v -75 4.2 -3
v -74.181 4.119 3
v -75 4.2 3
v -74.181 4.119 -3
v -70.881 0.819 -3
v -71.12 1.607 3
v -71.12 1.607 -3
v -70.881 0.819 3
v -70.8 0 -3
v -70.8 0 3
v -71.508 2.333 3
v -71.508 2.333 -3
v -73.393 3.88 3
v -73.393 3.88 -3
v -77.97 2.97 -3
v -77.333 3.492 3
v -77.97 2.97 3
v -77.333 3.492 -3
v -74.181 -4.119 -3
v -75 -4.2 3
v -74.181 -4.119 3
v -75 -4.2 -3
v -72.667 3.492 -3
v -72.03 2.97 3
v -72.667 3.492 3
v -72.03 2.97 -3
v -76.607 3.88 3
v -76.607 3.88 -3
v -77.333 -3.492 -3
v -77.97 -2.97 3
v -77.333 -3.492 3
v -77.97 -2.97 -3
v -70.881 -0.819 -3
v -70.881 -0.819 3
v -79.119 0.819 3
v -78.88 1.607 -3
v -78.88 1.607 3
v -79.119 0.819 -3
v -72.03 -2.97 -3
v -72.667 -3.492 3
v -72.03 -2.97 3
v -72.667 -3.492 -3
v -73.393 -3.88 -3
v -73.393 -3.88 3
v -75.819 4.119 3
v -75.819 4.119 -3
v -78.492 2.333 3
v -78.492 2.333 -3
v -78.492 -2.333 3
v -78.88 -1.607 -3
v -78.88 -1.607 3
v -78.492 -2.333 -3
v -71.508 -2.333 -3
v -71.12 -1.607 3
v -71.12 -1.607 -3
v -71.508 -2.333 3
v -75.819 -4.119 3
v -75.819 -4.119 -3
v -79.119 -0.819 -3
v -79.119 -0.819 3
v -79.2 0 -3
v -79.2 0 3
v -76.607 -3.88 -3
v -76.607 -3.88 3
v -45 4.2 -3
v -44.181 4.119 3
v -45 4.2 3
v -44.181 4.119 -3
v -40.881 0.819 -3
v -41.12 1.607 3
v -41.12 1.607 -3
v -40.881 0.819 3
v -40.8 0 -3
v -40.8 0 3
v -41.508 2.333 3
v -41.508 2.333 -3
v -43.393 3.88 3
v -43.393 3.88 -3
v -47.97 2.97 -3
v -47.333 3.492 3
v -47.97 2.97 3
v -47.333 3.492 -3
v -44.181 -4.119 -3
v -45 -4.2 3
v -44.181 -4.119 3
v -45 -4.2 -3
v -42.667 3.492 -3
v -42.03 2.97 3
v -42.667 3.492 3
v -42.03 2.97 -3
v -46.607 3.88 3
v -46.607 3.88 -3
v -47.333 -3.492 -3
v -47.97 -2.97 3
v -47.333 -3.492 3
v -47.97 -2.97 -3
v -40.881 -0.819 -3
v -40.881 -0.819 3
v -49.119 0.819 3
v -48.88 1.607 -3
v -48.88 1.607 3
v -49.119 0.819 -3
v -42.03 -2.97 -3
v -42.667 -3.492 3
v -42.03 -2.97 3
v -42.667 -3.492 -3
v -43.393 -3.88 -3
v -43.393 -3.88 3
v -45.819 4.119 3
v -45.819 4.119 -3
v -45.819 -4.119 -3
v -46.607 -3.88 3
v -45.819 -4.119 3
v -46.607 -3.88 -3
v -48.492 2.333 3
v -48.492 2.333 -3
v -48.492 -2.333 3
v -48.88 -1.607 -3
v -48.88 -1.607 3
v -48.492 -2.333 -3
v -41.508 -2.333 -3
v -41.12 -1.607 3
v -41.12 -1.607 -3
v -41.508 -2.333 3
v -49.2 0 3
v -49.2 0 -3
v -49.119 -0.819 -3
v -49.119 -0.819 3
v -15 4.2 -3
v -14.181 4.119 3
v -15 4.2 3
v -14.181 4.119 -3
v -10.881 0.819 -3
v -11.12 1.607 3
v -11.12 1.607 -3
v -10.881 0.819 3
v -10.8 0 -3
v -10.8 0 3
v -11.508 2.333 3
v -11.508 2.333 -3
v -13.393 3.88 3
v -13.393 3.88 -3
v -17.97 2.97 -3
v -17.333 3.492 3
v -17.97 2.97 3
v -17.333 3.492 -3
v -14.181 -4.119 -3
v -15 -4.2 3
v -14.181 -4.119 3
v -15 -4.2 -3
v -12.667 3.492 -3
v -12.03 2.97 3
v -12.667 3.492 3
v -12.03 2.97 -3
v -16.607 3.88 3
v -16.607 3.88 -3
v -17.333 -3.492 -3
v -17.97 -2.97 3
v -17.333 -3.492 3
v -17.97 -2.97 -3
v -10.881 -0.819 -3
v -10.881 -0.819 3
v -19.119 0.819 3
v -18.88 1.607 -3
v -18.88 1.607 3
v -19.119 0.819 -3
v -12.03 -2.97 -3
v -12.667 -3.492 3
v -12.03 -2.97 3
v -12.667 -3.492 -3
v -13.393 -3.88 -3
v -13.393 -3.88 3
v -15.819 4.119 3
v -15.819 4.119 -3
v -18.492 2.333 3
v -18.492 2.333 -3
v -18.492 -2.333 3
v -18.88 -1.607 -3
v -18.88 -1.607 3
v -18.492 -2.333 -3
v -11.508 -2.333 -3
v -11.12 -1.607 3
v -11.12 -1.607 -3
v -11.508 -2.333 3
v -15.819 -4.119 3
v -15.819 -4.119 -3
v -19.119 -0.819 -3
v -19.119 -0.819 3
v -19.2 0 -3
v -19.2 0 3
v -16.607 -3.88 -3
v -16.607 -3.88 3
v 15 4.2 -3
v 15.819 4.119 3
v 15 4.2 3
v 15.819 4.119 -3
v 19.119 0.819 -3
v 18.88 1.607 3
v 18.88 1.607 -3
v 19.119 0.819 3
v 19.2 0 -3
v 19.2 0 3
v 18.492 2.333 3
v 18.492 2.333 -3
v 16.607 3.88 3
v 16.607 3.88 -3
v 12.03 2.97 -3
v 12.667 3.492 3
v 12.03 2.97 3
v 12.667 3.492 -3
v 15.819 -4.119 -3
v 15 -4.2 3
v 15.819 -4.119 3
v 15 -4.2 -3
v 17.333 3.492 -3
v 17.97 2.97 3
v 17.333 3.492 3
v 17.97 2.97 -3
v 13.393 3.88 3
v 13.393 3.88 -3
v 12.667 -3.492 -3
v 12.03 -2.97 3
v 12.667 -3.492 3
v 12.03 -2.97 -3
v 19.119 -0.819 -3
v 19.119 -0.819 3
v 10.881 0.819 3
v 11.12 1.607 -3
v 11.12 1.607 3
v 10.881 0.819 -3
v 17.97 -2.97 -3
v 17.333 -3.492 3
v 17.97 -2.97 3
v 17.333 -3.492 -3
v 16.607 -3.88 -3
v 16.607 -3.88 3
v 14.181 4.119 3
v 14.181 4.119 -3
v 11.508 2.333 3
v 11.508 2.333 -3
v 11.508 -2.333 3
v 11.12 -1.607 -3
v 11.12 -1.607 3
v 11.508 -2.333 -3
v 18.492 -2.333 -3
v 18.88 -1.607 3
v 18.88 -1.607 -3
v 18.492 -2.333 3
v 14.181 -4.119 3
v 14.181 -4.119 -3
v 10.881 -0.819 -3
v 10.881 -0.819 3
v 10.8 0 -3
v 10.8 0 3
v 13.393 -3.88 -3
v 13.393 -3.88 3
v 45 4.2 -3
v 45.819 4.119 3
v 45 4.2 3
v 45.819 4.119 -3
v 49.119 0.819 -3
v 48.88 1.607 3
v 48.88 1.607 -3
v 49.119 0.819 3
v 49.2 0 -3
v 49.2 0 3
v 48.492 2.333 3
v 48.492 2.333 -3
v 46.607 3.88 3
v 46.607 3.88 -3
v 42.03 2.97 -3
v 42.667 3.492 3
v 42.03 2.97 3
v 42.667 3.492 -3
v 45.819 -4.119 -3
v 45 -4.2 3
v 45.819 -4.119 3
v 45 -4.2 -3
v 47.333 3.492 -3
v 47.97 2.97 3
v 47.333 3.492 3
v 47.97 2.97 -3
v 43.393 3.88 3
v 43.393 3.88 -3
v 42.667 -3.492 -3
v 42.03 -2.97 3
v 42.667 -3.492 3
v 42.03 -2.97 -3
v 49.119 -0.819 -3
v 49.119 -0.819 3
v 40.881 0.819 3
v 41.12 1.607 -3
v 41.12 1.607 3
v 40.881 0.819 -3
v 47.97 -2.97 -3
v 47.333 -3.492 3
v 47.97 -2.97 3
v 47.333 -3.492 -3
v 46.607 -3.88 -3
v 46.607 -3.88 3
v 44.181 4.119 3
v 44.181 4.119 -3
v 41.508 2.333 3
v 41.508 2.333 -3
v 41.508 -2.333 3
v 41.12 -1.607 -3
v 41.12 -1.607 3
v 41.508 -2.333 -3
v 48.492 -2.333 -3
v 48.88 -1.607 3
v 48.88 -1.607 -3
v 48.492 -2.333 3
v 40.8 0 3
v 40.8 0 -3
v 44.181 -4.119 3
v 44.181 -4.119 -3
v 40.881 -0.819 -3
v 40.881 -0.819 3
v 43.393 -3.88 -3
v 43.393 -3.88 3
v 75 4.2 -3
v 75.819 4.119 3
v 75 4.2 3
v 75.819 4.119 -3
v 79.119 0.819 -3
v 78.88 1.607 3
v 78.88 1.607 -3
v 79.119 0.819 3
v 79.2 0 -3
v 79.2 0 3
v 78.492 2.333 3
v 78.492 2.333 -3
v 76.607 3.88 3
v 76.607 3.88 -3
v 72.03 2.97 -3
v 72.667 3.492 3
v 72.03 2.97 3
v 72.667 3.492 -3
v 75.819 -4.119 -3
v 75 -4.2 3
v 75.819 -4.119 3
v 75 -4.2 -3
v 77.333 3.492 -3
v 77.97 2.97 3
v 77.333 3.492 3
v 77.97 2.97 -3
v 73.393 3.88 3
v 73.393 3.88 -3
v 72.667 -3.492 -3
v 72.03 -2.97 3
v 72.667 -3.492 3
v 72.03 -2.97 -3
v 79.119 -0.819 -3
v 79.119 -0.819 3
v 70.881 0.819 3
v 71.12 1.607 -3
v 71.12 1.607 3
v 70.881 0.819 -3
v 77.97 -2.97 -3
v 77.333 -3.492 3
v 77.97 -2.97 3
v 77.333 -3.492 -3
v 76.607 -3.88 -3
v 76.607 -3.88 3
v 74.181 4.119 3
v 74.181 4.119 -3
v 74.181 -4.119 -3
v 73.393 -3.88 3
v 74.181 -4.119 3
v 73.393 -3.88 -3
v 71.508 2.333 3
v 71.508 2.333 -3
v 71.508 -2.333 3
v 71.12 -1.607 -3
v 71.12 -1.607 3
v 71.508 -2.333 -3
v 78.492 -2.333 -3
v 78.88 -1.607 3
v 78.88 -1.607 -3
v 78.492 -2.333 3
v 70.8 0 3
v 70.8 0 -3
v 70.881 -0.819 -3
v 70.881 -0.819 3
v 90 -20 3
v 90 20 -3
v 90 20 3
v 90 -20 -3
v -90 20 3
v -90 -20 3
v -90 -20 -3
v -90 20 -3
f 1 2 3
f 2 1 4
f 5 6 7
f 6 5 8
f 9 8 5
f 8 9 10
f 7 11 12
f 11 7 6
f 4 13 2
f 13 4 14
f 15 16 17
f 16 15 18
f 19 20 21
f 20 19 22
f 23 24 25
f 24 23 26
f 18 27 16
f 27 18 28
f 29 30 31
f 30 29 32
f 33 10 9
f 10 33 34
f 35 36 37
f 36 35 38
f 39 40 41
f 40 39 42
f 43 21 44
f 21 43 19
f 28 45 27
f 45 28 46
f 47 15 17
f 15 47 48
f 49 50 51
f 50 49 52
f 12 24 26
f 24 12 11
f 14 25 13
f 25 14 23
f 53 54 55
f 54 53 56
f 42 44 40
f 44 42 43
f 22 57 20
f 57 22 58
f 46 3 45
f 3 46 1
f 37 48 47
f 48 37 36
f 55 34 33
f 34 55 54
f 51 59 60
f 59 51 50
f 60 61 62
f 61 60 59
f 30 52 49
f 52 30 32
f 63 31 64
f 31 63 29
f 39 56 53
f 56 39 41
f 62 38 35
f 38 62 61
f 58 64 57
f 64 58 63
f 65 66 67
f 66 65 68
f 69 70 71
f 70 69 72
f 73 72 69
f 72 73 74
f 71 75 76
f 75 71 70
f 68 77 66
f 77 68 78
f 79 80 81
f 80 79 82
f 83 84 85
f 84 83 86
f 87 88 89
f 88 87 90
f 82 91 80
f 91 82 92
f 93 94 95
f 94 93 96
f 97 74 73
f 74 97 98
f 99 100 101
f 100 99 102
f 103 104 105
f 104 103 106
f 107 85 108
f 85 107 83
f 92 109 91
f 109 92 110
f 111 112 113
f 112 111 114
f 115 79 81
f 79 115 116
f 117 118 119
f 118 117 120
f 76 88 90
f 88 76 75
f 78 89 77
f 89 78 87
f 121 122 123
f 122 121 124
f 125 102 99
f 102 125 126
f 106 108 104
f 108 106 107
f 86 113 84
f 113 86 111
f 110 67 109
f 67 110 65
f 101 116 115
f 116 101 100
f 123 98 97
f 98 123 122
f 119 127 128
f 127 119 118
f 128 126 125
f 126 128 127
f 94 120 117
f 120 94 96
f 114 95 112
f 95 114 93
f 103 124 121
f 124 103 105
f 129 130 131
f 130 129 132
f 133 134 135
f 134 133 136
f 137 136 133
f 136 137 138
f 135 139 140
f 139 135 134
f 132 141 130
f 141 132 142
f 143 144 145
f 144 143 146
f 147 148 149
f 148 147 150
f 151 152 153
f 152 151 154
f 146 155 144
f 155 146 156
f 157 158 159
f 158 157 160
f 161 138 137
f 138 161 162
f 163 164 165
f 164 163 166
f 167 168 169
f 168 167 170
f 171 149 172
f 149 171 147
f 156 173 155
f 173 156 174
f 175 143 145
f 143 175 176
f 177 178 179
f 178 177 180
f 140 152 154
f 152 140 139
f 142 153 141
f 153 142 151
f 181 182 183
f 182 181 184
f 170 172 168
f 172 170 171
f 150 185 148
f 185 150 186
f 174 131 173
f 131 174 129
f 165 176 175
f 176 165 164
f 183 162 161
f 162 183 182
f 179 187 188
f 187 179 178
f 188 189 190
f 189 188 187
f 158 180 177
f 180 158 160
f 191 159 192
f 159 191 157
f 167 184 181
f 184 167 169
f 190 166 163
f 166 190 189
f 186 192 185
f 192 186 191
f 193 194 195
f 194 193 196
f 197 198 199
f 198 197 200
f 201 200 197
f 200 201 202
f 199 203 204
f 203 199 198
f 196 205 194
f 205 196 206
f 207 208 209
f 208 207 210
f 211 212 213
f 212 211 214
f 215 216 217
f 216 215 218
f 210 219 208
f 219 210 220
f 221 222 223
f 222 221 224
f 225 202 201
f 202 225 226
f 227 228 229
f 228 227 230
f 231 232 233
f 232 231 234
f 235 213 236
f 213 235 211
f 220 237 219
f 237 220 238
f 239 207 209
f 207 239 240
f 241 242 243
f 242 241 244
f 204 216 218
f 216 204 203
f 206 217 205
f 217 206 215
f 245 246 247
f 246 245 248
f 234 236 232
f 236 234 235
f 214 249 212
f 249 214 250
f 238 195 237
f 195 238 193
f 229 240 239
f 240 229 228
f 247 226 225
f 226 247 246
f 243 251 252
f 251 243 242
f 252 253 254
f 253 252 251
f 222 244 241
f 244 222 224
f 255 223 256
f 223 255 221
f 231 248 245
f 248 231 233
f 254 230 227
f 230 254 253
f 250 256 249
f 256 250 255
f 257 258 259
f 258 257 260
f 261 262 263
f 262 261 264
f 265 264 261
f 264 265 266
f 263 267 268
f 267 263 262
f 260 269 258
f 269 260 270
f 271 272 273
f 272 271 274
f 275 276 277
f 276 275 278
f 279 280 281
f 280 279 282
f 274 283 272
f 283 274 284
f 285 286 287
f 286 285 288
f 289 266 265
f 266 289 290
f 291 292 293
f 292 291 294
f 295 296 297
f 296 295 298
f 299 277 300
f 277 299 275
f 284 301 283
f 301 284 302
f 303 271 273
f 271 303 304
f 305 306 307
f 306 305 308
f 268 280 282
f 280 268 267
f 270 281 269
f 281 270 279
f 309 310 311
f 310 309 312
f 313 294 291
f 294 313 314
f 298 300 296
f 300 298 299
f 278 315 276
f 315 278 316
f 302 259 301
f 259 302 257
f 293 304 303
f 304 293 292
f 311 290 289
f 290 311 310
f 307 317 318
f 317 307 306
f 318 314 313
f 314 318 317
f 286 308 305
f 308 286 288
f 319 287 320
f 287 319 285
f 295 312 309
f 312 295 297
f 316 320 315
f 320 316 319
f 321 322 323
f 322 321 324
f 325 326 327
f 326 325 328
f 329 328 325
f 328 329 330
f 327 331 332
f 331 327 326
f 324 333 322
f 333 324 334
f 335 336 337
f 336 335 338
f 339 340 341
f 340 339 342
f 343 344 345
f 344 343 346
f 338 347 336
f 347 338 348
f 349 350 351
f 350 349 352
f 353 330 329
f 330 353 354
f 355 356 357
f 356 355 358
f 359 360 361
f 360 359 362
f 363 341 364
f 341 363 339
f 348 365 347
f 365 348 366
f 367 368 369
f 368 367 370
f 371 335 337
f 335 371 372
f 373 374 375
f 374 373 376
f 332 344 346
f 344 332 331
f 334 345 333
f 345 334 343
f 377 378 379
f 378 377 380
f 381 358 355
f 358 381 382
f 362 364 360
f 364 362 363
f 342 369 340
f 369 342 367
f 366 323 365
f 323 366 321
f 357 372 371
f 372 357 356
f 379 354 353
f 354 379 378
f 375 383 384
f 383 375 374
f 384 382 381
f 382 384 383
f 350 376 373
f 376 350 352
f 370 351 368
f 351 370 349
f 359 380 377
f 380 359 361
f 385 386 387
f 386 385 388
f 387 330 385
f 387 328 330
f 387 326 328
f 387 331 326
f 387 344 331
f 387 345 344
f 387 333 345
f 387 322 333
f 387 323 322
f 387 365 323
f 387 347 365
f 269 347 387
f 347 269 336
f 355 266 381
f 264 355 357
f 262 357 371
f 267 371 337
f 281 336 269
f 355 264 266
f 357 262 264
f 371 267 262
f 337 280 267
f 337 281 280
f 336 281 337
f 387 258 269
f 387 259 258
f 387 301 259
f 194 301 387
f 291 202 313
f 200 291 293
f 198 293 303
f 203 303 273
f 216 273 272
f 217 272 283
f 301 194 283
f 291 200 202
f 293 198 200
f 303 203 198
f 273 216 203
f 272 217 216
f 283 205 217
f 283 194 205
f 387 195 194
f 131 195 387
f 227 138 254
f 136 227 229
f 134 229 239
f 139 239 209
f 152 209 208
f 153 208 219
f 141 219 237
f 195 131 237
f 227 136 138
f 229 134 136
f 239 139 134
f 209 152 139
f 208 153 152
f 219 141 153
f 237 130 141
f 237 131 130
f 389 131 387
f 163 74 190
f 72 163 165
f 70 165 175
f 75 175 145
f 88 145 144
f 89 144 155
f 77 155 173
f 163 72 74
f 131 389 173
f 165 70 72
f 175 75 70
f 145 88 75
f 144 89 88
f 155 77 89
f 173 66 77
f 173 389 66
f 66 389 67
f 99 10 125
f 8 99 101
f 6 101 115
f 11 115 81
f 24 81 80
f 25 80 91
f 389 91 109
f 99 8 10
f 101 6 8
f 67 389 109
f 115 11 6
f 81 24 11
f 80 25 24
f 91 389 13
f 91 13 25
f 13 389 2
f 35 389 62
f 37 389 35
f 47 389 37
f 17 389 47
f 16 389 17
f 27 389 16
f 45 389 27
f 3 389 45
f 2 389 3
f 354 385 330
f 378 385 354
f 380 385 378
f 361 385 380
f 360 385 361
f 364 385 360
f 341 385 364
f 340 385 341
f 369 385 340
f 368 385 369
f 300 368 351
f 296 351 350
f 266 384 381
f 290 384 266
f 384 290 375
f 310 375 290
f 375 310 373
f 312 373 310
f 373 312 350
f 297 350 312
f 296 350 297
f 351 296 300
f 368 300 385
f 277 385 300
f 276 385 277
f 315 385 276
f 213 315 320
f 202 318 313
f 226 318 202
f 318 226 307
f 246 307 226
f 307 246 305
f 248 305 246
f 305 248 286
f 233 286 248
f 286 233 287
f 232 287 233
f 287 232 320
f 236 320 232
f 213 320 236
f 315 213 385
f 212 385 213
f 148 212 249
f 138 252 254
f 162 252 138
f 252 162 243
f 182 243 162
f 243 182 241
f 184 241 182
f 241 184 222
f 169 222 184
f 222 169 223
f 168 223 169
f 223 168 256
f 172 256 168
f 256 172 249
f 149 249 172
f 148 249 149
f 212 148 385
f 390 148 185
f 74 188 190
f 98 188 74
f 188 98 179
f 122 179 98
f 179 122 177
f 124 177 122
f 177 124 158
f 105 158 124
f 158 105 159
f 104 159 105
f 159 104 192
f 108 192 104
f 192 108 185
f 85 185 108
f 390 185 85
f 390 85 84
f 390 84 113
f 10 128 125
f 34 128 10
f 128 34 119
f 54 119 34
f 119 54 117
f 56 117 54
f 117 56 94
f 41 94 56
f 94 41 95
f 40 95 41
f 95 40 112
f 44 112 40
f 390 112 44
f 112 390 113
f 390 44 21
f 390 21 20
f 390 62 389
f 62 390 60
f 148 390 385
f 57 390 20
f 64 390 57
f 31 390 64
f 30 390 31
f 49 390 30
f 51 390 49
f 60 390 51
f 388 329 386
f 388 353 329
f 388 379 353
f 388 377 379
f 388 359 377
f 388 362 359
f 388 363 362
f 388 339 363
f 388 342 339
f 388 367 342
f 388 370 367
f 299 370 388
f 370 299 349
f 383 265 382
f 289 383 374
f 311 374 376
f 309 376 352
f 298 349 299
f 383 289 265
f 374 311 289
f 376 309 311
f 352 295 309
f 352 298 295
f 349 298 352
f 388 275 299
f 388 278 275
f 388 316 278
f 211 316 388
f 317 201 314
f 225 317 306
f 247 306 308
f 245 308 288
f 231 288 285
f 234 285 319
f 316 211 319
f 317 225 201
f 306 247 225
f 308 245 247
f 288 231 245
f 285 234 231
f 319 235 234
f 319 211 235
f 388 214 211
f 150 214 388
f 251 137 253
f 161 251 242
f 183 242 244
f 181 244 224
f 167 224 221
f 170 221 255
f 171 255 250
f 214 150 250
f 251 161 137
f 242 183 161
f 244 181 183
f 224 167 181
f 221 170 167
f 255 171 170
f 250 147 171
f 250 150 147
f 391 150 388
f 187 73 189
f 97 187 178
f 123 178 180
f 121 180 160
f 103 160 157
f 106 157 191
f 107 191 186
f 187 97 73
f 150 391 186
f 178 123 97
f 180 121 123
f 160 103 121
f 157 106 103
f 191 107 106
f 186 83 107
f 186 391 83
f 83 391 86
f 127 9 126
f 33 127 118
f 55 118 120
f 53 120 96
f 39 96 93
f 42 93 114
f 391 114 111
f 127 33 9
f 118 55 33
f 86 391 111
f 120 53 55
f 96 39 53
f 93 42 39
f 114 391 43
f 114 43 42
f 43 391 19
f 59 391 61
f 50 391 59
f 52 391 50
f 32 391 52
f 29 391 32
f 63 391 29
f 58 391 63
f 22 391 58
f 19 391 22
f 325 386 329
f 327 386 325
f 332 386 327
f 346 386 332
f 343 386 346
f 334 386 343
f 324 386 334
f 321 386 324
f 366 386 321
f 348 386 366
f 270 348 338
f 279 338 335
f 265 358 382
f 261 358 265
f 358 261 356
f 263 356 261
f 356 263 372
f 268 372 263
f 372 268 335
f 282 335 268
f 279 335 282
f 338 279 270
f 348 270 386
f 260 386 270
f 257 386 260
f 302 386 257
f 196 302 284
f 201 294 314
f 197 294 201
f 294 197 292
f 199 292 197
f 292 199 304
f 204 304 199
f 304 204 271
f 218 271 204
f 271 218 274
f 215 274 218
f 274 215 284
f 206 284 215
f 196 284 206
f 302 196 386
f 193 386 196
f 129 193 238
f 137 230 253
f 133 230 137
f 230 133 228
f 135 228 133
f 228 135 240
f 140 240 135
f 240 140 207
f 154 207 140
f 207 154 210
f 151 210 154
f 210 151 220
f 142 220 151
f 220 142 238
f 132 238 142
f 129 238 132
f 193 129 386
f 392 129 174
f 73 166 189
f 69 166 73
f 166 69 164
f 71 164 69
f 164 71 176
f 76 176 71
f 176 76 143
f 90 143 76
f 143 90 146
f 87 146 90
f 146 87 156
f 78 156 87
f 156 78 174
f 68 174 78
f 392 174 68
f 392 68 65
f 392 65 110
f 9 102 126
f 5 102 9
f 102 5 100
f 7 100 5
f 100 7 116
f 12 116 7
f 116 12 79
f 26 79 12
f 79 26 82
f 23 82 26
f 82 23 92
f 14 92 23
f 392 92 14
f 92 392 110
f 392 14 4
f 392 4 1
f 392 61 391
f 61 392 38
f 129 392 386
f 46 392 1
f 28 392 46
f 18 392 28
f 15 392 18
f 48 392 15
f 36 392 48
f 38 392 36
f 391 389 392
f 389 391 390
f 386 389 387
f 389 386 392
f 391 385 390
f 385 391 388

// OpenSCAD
$fn = 32;

// ----------------------------------------------------------------------
// Hole bar, 6 x Ø8.4
// row layout, 15 mm edge offset
// ----------------------------------------------------------------------

// --- parameters (mm) ---
bar_w = 40;    // bar width (Y)
bar_t = 6;     // bar thickness (Z)
holes = 6;     // holes per row
hole_d = 8.4;  // hole diameter
edge = 15;     // offset from the bar end to the first hole
pitch = 30;    // pitch between neighbouring holes

// --- derived feature positions (mm) ---
span = (holes - 1) * pitch;   // = 150   distance between the end holes
bar_l = span + 2 * edge;      // = 180   overall bar length
start_x = -bar_l / 2 + edge;  // = -75   X of the first hole
feature_centers = [
  [start_x + 0 * pitch, 0],
  [start_x + 1 * pitch, 0],
  [start_x + 2 * pitch, 0],
  [start_x + 3 * pitch, 0],
  [start_x + 4 * pitch, 0],
  [start_x + 5 * pitch, 0]
];   // hole centres of the first row

// bar with one row of holes, drilled from feature_centers
difference() {
  translate([-bar_l / 2, -bar_w / 2, -bar_t / 2]) cube([bar_l, bar_w, bar_t]);
  for (centre = feature_centers)
    translate([centre[0], centre[1], 0])
      cylinder(d = hole_d, h = bar_t + 2, center = true);
}
